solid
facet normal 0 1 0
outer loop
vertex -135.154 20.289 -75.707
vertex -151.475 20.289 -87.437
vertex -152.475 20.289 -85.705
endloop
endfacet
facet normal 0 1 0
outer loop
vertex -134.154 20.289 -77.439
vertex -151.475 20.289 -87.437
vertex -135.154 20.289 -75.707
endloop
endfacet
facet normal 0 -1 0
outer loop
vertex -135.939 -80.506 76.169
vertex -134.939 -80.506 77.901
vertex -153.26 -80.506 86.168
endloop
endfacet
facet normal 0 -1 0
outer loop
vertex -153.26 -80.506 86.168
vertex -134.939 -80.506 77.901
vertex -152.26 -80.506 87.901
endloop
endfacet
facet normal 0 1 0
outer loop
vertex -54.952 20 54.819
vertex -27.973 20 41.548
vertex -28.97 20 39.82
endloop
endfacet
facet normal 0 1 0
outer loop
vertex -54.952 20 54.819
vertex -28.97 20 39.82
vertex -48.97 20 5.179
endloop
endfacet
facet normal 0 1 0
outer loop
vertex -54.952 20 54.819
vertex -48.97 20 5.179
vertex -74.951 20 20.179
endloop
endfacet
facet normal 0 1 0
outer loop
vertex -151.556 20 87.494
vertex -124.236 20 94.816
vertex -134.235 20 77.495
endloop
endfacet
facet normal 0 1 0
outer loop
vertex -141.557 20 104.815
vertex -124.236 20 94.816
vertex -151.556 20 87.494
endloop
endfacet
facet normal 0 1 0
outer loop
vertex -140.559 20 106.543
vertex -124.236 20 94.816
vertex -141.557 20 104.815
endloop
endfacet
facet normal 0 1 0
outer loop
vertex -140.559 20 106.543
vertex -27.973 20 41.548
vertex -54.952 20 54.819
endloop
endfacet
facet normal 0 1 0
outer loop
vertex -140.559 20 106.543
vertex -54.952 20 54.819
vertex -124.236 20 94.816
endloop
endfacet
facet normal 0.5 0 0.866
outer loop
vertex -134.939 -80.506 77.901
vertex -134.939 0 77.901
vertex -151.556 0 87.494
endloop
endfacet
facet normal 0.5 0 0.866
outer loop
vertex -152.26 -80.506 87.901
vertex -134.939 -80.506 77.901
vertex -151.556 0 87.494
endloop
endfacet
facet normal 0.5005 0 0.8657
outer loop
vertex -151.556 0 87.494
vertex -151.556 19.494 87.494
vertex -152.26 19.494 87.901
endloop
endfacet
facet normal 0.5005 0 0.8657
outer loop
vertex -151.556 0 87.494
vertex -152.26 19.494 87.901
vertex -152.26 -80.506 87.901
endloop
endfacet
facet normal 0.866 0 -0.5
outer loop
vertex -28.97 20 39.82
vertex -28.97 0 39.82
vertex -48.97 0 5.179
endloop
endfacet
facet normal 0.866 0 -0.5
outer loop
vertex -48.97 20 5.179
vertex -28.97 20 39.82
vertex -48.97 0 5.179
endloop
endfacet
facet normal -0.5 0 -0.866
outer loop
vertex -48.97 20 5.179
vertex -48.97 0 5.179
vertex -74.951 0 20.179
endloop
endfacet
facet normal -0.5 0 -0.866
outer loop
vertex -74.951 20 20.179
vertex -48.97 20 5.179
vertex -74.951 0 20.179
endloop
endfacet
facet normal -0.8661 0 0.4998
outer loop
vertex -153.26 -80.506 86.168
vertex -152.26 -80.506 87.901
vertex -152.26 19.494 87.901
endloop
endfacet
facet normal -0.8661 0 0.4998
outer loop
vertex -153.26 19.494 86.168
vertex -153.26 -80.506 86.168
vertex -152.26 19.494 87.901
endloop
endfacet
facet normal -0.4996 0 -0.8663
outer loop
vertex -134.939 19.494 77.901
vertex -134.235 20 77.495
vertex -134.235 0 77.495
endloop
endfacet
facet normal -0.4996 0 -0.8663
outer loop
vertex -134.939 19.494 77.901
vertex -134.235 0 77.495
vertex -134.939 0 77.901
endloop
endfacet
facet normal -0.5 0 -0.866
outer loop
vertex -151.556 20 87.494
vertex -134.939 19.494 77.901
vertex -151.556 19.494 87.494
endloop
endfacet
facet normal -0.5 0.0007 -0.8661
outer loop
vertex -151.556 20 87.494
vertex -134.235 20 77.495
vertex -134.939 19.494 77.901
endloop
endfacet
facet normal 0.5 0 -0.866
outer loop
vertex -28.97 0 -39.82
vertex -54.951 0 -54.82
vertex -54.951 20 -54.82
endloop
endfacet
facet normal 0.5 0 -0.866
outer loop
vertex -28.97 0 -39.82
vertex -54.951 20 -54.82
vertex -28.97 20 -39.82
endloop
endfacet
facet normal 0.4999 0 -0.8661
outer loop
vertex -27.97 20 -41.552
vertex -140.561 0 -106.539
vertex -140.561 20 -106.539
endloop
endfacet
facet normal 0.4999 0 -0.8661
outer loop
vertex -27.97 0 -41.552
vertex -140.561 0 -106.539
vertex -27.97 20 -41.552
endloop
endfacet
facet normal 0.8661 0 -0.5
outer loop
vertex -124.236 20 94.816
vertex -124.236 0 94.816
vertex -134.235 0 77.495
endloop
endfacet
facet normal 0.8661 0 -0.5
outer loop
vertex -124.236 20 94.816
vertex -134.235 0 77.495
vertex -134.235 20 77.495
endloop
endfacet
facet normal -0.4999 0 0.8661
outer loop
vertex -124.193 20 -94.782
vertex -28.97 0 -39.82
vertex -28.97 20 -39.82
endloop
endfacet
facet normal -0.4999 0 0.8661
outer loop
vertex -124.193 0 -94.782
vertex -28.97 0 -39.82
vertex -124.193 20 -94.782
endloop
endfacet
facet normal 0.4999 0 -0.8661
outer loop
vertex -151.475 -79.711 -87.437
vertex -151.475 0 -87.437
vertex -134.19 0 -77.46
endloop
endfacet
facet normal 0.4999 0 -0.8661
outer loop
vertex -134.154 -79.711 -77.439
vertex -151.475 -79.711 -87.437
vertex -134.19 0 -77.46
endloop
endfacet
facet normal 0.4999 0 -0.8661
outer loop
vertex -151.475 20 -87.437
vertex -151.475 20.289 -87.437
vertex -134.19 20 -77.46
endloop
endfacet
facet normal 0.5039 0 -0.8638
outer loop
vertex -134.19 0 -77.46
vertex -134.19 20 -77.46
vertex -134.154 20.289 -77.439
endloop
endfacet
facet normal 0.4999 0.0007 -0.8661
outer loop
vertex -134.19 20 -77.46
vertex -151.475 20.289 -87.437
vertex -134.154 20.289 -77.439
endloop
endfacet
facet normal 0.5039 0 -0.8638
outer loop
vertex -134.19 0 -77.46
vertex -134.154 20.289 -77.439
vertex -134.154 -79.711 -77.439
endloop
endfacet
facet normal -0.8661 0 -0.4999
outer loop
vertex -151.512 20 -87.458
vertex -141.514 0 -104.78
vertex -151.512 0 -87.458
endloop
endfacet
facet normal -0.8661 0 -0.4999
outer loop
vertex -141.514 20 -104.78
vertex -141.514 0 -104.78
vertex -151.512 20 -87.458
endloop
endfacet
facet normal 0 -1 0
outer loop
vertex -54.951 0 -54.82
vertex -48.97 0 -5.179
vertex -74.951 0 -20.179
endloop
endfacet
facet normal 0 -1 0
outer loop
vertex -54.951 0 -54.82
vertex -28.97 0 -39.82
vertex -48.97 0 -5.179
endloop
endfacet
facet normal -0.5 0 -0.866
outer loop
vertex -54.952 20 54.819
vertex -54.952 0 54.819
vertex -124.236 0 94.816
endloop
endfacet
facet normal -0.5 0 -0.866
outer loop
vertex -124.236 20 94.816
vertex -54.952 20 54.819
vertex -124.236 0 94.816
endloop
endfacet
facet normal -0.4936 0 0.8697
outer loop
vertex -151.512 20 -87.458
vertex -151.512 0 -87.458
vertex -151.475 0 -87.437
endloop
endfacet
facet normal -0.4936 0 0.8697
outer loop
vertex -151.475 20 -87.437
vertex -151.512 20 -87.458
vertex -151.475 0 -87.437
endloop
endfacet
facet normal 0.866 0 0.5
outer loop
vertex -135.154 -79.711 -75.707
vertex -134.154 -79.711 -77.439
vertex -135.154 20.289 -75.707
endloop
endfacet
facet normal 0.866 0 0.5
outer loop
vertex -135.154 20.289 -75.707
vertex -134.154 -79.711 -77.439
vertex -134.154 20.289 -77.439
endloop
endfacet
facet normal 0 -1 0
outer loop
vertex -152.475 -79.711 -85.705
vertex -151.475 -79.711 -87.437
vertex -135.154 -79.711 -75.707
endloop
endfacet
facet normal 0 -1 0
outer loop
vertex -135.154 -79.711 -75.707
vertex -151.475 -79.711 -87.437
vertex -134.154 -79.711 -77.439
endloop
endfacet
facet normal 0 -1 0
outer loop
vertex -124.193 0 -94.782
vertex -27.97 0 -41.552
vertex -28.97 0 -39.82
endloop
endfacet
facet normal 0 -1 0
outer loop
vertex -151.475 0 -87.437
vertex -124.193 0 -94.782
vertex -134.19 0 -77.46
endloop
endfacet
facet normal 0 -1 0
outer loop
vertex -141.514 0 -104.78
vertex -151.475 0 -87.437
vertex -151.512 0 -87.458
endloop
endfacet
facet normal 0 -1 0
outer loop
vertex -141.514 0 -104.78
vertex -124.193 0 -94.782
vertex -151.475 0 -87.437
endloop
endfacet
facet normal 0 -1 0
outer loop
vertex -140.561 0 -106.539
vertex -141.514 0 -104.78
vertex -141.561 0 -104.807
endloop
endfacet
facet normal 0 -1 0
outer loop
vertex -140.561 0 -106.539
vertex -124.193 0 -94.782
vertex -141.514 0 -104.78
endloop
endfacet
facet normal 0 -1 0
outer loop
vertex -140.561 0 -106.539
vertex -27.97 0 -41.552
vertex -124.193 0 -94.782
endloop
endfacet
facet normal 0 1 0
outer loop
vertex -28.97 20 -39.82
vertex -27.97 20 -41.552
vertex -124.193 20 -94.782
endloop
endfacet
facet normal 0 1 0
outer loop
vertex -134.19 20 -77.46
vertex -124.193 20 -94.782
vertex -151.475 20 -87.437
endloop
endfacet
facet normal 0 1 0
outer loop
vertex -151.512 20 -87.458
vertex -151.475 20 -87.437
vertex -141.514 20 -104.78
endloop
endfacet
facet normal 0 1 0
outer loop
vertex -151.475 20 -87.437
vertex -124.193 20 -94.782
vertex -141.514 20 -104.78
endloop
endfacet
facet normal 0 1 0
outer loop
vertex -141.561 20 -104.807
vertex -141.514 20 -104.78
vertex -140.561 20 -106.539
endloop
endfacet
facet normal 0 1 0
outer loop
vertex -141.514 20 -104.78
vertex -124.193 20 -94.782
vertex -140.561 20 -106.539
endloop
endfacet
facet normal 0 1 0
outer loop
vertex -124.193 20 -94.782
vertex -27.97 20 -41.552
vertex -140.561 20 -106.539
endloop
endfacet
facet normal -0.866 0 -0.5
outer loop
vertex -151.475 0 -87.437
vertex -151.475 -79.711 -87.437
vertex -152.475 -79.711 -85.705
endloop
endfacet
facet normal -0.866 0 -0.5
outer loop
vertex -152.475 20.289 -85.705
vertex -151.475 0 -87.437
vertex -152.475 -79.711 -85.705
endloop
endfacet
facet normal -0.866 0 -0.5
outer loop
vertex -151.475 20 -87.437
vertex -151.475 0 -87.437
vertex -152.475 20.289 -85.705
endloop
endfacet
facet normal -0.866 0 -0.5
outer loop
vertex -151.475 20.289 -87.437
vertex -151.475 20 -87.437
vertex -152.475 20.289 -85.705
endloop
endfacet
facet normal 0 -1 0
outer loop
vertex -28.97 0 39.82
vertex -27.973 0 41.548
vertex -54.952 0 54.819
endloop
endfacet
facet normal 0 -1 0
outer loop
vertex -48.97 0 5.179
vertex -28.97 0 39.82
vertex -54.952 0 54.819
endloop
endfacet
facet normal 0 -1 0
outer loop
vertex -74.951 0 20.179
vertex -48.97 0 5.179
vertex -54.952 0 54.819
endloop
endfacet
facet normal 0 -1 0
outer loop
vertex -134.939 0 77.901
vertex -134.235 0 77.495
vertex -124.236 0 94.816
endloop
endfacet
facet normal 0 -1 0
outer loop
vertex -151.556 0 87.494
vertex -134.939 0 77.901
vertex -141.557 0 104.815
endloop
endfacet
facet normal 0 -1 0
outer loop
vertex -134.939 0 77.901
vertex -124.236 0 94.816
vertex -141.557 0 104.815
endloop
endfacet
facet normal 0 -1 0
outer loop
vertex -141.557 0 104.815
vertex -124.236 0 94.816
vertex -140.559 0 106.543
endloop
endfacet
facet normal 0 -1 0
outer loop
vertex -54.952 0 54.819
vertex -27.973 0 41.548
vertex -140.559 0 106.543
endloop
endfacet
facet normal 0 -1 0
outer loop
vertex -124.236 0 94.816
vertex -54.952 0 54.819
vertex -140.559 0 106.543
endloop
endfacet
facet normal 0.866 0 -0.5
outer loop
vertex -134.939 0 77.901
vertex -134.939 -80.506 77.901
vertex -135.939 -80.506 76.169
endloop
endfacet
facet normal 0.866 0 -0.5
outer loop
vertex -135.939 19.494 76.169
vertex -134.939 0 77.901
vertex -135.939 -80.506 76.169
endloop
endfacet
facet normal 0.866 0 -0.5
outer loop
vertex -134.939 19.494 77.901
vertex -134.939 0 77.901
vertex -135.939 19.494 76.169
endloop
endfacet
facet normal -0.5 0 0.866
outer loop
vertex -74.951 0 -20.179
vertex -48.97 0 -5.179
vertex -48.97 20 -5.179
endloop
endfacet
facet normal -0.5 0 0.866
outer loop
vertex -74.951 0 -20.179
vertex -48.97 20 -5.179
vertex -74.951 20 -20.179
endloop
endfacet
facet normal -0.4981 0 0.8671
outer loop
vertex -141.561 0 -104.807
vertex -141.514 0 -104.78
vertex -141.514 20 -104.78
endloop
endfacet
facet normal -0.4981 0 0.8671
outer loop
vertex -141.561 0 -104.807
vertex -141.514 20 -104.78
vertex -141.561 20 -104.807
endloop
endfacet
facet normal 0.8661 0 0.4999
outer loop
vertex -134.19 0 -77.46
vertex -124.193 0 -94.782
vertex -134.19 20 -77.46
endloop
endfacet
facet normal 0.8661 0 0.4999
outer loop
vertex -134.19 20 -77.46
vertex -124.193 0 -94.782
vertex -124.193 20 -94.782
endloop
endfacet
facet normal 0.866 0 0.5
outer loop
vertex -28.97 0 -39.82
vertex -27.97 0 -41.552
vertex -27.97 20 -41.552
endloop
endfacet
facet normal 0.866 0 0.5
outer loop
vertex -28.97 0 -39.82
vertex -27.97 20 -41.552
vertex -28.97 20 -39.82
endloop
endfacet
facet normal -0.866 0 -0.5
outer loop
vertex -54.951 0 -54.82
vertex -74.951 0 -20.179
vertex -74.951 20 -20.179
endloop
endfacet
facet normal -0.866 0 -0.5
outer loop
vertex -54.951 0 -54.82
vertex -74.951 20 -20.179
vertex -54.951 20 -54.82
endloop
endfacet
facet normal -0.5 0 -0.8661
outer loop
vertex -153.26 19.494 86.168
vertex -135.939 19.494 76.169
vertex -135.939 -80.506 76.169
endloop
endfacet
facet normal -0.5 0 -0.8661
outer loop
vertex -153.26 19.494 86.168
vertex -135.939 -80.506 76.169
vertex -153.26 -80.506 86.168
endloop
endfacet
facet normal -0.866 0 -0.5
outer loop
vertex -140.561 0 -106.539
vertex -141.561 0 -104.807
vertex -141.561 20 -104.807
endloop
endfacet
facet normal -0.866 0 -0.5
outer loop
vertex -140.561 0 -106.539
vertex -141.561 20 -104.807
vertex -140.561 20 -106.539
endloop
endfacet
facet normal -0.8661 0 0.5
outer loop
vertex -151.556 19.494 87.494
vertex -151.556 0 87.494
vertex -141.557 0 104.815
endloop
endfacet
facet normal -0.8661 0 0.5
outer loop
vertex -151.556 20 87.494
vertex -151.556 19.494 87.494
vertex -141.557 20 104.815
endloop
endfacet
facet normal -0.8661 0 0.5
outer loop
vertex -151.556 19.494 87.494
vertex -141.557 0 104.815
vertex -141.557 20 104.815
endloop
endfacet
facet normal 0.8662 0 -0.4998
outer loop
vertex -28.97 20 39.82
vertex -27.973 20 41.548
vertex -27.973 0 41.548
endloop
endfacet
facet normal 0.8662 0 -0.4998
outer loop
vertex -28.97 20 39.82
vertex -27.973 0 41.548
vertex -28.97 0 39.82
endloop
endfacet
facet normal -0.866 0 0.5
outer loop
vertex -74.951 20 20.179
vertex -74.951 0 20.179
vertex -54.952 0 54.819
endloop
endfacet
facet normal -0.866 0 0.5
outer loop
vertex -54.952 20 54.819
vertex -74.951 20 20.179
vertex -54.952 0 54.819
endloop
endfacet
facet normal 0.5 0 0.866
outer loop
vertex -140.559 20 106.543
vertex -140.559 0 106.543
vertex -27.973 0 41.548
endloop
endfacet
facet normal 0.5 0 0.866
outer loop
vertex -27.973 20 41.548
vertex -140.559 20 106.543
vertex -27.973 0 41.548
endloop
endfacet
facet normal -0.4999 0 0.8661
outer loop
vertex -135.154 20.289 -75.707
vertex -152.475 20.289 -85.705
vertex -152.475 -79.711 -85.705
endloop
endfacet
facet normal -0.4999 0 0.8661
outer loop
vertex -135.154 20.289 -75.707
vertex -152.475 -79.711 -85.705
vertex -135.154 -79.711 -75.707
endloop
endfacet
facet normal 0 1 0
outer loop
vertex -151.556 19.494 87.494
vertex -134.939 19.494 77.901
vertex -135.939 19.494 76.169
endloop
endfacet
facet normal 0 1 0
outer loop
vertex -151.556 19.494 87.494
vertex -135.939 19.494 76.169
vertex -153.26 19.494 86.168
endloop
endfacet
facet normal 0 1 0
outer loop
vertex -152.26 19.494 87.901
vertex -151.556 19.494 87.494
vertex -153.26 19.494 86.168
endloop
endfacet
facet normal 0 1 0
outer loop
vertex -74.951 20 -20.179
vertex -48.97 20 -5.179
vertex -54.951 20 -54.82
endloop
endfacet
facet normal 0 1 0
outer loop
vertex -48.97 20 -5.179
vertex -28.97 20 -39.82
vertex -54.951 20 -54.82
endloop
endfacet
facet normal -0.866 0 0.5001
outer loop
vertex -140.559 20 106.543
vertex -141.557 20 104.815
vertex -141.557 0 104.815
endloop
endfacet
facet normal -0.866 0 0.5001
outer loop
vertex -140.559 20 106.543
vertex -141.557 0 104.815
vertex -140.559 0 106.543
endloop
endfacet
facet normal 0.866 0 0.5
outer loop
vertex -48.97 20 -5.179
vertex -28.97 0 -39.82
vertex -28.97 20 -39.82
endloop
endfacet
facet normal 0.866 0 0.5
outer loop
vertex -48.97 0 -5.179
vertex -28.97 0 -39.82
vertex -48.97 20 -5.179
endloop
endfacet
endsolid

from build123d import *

# Parameters (mm, degrees)
EXTRUDE_1_DEPTH   = 20
EXTRUDE_1_2_DEPTH = 20
EXTRUDE_2_DEPTH   = 20
SKETCH_5_W        = 20
SKETCH_5_H        = 20
EXTRUDE_3_DEPTH   = 20
SKETCH_6_W        = 20
SKETCH_6_H        = 20
EXTRUDE_4_DEPTH   = 20
SKETCH_7_W        = 20
SKETCH_7_H        = 100
EXTRUDE_5_DEPTH   = 2
SKETCH_8_W        = 20
SKETCH_8_H        = 100
EXTRUDE_6_DEPTH   = 2


with BuildPart() as part:
    # 草图3 → 凸台-拉伸1 (new body)
    with BuildSketch(Plane(origin=(0, 0, 0), x_dir=(1, 0, 0), z_dir=(0, 1, 0))):
        Polygon((-48.970199781, -5.178947258), (-74.950961894, -20.178947258), (-54.950961894, -54.81996341), (-28.970199781, -39.81996341), align=None)
    extrude(amount=EXTRUDE_1_DEPTH)

    # 草图4 → 凸台-拉伸2 (add)
    with BuildSketch(Plane(origin=(0, 0, 0), x_dir=(1, 0, 0), z_dir=(0, 1, 0))):
        Polygon((-28.970199781, -39.81996341), (-141.556509073, -104.814755201), (-140.558949664, -106.542763385), (-27.972640372, -41.547971593), align=None)
        Polygon((-28.970199776, 39.81996341), (-141.561064948, 104.806862704), (-140.561266498, 106.539029861), (-27.970401326, 41.552130566), align=None)
    extrude(amount=EXTRUDE_2_DEPTH)


with BuildPart() as body_2:
    # 草图3 → Extrude 1 2 (new body)
    with BuildSketch(Plane(origin=(0, 0, 0), x_dir=(1, 0, 0), z_dir=(0, 1, 0))):
        Polygon((-48.970199776, 5.178947259), (-74.95096189, 20.178947259), (-54.95096189, 54.81996341), (-28.970199776, 39.81996341), align=None)
    extrude(amount=EXTRUDE_1_2_DEPTH)


with BuildPart() as extrude_2_piece_1:
    # of the separate pieces the step leaves, piece 1, a body of its own (extrude_2_pieces)
    add(part.part.solids().sort_by_distance((-48.970199781, 0, 5.178947258))[0])

    # 草图5 → 凸台-拉伸3 (add)
    with BuildSketch(Plane(origin=(10.000239475, 0, 17.322773464), x_dir=(-0.8660485330140629, 0, 0.4999599368591344), z_dir=(-0.49995993685913437, 0, -0.8660485330140628))):
        with Locations((164.997985413, 10)):
            Rectangle(SKETCH_5_W, SKETCH_5_H)
    extrude(amount=EXTRUDE_3_DEPTH)

    # 草图7 → 凸台-拉伸5 (add)
    with BuildSketch(Plane(origin=(0.001040738, 0, 0.001802803), x_dir=(-0.8660485330140629, 0, 0.4999599368591345), z_dir=(-0.4999599368591345, 0, -0.8660485330140629))):
        with Locations((165.811665731, -30.506267148)):
            Rectangle(SKETCH_7_W, SKETCH_7_H)
    extrude(amount=EXTRUDE_5_DEPTH)


with BuildPart() as extrude_2_piece_2:
    # of the separate pieces the step leaves, piece 2, a body of its own (extrude_2_pieces)
    add(part.part.solids().sort_by_distance((-28.970199776, 0, -39.81996341))[0])

    # 草图6 → 凸台-拉伸4 (add)
    with BuildSketch(Plane(origin=(10.000601964, 0, -17.326206352), x_dir=(0.8660835782445356, 0, 0.4998992253396093), z_dir=(-0.49989922533960923, 0, 0.8660835782445355))):
        with Locations((-164.94245125, 10)):
            Rectangle(SKETCH_6_W, SKETCH_6_H)
    extrude(amount=EXTRUDE_4_DEPTH)

    # 草图8 → 凸台-拉伸6 (add)
    with BuildSketch(Plane(origin=(0.002617457, 0, -0.004534787), x_dir=(0.8660835782445356, 0, 0.4998992253396092), z_dir=(-0.4998992253396092, 0, 0.8660835782445356))):
        with Locations((-164.900062676, -29.71065336)):
            Rectangle(SKETCH_8_W, SKETCH_8_H)
    extrude(amount=EXTRUDE_6_DEPTH)


solid = Compound([body_2.part, extrude_2_piece_1.part, extrude_2_piece_2.part])
